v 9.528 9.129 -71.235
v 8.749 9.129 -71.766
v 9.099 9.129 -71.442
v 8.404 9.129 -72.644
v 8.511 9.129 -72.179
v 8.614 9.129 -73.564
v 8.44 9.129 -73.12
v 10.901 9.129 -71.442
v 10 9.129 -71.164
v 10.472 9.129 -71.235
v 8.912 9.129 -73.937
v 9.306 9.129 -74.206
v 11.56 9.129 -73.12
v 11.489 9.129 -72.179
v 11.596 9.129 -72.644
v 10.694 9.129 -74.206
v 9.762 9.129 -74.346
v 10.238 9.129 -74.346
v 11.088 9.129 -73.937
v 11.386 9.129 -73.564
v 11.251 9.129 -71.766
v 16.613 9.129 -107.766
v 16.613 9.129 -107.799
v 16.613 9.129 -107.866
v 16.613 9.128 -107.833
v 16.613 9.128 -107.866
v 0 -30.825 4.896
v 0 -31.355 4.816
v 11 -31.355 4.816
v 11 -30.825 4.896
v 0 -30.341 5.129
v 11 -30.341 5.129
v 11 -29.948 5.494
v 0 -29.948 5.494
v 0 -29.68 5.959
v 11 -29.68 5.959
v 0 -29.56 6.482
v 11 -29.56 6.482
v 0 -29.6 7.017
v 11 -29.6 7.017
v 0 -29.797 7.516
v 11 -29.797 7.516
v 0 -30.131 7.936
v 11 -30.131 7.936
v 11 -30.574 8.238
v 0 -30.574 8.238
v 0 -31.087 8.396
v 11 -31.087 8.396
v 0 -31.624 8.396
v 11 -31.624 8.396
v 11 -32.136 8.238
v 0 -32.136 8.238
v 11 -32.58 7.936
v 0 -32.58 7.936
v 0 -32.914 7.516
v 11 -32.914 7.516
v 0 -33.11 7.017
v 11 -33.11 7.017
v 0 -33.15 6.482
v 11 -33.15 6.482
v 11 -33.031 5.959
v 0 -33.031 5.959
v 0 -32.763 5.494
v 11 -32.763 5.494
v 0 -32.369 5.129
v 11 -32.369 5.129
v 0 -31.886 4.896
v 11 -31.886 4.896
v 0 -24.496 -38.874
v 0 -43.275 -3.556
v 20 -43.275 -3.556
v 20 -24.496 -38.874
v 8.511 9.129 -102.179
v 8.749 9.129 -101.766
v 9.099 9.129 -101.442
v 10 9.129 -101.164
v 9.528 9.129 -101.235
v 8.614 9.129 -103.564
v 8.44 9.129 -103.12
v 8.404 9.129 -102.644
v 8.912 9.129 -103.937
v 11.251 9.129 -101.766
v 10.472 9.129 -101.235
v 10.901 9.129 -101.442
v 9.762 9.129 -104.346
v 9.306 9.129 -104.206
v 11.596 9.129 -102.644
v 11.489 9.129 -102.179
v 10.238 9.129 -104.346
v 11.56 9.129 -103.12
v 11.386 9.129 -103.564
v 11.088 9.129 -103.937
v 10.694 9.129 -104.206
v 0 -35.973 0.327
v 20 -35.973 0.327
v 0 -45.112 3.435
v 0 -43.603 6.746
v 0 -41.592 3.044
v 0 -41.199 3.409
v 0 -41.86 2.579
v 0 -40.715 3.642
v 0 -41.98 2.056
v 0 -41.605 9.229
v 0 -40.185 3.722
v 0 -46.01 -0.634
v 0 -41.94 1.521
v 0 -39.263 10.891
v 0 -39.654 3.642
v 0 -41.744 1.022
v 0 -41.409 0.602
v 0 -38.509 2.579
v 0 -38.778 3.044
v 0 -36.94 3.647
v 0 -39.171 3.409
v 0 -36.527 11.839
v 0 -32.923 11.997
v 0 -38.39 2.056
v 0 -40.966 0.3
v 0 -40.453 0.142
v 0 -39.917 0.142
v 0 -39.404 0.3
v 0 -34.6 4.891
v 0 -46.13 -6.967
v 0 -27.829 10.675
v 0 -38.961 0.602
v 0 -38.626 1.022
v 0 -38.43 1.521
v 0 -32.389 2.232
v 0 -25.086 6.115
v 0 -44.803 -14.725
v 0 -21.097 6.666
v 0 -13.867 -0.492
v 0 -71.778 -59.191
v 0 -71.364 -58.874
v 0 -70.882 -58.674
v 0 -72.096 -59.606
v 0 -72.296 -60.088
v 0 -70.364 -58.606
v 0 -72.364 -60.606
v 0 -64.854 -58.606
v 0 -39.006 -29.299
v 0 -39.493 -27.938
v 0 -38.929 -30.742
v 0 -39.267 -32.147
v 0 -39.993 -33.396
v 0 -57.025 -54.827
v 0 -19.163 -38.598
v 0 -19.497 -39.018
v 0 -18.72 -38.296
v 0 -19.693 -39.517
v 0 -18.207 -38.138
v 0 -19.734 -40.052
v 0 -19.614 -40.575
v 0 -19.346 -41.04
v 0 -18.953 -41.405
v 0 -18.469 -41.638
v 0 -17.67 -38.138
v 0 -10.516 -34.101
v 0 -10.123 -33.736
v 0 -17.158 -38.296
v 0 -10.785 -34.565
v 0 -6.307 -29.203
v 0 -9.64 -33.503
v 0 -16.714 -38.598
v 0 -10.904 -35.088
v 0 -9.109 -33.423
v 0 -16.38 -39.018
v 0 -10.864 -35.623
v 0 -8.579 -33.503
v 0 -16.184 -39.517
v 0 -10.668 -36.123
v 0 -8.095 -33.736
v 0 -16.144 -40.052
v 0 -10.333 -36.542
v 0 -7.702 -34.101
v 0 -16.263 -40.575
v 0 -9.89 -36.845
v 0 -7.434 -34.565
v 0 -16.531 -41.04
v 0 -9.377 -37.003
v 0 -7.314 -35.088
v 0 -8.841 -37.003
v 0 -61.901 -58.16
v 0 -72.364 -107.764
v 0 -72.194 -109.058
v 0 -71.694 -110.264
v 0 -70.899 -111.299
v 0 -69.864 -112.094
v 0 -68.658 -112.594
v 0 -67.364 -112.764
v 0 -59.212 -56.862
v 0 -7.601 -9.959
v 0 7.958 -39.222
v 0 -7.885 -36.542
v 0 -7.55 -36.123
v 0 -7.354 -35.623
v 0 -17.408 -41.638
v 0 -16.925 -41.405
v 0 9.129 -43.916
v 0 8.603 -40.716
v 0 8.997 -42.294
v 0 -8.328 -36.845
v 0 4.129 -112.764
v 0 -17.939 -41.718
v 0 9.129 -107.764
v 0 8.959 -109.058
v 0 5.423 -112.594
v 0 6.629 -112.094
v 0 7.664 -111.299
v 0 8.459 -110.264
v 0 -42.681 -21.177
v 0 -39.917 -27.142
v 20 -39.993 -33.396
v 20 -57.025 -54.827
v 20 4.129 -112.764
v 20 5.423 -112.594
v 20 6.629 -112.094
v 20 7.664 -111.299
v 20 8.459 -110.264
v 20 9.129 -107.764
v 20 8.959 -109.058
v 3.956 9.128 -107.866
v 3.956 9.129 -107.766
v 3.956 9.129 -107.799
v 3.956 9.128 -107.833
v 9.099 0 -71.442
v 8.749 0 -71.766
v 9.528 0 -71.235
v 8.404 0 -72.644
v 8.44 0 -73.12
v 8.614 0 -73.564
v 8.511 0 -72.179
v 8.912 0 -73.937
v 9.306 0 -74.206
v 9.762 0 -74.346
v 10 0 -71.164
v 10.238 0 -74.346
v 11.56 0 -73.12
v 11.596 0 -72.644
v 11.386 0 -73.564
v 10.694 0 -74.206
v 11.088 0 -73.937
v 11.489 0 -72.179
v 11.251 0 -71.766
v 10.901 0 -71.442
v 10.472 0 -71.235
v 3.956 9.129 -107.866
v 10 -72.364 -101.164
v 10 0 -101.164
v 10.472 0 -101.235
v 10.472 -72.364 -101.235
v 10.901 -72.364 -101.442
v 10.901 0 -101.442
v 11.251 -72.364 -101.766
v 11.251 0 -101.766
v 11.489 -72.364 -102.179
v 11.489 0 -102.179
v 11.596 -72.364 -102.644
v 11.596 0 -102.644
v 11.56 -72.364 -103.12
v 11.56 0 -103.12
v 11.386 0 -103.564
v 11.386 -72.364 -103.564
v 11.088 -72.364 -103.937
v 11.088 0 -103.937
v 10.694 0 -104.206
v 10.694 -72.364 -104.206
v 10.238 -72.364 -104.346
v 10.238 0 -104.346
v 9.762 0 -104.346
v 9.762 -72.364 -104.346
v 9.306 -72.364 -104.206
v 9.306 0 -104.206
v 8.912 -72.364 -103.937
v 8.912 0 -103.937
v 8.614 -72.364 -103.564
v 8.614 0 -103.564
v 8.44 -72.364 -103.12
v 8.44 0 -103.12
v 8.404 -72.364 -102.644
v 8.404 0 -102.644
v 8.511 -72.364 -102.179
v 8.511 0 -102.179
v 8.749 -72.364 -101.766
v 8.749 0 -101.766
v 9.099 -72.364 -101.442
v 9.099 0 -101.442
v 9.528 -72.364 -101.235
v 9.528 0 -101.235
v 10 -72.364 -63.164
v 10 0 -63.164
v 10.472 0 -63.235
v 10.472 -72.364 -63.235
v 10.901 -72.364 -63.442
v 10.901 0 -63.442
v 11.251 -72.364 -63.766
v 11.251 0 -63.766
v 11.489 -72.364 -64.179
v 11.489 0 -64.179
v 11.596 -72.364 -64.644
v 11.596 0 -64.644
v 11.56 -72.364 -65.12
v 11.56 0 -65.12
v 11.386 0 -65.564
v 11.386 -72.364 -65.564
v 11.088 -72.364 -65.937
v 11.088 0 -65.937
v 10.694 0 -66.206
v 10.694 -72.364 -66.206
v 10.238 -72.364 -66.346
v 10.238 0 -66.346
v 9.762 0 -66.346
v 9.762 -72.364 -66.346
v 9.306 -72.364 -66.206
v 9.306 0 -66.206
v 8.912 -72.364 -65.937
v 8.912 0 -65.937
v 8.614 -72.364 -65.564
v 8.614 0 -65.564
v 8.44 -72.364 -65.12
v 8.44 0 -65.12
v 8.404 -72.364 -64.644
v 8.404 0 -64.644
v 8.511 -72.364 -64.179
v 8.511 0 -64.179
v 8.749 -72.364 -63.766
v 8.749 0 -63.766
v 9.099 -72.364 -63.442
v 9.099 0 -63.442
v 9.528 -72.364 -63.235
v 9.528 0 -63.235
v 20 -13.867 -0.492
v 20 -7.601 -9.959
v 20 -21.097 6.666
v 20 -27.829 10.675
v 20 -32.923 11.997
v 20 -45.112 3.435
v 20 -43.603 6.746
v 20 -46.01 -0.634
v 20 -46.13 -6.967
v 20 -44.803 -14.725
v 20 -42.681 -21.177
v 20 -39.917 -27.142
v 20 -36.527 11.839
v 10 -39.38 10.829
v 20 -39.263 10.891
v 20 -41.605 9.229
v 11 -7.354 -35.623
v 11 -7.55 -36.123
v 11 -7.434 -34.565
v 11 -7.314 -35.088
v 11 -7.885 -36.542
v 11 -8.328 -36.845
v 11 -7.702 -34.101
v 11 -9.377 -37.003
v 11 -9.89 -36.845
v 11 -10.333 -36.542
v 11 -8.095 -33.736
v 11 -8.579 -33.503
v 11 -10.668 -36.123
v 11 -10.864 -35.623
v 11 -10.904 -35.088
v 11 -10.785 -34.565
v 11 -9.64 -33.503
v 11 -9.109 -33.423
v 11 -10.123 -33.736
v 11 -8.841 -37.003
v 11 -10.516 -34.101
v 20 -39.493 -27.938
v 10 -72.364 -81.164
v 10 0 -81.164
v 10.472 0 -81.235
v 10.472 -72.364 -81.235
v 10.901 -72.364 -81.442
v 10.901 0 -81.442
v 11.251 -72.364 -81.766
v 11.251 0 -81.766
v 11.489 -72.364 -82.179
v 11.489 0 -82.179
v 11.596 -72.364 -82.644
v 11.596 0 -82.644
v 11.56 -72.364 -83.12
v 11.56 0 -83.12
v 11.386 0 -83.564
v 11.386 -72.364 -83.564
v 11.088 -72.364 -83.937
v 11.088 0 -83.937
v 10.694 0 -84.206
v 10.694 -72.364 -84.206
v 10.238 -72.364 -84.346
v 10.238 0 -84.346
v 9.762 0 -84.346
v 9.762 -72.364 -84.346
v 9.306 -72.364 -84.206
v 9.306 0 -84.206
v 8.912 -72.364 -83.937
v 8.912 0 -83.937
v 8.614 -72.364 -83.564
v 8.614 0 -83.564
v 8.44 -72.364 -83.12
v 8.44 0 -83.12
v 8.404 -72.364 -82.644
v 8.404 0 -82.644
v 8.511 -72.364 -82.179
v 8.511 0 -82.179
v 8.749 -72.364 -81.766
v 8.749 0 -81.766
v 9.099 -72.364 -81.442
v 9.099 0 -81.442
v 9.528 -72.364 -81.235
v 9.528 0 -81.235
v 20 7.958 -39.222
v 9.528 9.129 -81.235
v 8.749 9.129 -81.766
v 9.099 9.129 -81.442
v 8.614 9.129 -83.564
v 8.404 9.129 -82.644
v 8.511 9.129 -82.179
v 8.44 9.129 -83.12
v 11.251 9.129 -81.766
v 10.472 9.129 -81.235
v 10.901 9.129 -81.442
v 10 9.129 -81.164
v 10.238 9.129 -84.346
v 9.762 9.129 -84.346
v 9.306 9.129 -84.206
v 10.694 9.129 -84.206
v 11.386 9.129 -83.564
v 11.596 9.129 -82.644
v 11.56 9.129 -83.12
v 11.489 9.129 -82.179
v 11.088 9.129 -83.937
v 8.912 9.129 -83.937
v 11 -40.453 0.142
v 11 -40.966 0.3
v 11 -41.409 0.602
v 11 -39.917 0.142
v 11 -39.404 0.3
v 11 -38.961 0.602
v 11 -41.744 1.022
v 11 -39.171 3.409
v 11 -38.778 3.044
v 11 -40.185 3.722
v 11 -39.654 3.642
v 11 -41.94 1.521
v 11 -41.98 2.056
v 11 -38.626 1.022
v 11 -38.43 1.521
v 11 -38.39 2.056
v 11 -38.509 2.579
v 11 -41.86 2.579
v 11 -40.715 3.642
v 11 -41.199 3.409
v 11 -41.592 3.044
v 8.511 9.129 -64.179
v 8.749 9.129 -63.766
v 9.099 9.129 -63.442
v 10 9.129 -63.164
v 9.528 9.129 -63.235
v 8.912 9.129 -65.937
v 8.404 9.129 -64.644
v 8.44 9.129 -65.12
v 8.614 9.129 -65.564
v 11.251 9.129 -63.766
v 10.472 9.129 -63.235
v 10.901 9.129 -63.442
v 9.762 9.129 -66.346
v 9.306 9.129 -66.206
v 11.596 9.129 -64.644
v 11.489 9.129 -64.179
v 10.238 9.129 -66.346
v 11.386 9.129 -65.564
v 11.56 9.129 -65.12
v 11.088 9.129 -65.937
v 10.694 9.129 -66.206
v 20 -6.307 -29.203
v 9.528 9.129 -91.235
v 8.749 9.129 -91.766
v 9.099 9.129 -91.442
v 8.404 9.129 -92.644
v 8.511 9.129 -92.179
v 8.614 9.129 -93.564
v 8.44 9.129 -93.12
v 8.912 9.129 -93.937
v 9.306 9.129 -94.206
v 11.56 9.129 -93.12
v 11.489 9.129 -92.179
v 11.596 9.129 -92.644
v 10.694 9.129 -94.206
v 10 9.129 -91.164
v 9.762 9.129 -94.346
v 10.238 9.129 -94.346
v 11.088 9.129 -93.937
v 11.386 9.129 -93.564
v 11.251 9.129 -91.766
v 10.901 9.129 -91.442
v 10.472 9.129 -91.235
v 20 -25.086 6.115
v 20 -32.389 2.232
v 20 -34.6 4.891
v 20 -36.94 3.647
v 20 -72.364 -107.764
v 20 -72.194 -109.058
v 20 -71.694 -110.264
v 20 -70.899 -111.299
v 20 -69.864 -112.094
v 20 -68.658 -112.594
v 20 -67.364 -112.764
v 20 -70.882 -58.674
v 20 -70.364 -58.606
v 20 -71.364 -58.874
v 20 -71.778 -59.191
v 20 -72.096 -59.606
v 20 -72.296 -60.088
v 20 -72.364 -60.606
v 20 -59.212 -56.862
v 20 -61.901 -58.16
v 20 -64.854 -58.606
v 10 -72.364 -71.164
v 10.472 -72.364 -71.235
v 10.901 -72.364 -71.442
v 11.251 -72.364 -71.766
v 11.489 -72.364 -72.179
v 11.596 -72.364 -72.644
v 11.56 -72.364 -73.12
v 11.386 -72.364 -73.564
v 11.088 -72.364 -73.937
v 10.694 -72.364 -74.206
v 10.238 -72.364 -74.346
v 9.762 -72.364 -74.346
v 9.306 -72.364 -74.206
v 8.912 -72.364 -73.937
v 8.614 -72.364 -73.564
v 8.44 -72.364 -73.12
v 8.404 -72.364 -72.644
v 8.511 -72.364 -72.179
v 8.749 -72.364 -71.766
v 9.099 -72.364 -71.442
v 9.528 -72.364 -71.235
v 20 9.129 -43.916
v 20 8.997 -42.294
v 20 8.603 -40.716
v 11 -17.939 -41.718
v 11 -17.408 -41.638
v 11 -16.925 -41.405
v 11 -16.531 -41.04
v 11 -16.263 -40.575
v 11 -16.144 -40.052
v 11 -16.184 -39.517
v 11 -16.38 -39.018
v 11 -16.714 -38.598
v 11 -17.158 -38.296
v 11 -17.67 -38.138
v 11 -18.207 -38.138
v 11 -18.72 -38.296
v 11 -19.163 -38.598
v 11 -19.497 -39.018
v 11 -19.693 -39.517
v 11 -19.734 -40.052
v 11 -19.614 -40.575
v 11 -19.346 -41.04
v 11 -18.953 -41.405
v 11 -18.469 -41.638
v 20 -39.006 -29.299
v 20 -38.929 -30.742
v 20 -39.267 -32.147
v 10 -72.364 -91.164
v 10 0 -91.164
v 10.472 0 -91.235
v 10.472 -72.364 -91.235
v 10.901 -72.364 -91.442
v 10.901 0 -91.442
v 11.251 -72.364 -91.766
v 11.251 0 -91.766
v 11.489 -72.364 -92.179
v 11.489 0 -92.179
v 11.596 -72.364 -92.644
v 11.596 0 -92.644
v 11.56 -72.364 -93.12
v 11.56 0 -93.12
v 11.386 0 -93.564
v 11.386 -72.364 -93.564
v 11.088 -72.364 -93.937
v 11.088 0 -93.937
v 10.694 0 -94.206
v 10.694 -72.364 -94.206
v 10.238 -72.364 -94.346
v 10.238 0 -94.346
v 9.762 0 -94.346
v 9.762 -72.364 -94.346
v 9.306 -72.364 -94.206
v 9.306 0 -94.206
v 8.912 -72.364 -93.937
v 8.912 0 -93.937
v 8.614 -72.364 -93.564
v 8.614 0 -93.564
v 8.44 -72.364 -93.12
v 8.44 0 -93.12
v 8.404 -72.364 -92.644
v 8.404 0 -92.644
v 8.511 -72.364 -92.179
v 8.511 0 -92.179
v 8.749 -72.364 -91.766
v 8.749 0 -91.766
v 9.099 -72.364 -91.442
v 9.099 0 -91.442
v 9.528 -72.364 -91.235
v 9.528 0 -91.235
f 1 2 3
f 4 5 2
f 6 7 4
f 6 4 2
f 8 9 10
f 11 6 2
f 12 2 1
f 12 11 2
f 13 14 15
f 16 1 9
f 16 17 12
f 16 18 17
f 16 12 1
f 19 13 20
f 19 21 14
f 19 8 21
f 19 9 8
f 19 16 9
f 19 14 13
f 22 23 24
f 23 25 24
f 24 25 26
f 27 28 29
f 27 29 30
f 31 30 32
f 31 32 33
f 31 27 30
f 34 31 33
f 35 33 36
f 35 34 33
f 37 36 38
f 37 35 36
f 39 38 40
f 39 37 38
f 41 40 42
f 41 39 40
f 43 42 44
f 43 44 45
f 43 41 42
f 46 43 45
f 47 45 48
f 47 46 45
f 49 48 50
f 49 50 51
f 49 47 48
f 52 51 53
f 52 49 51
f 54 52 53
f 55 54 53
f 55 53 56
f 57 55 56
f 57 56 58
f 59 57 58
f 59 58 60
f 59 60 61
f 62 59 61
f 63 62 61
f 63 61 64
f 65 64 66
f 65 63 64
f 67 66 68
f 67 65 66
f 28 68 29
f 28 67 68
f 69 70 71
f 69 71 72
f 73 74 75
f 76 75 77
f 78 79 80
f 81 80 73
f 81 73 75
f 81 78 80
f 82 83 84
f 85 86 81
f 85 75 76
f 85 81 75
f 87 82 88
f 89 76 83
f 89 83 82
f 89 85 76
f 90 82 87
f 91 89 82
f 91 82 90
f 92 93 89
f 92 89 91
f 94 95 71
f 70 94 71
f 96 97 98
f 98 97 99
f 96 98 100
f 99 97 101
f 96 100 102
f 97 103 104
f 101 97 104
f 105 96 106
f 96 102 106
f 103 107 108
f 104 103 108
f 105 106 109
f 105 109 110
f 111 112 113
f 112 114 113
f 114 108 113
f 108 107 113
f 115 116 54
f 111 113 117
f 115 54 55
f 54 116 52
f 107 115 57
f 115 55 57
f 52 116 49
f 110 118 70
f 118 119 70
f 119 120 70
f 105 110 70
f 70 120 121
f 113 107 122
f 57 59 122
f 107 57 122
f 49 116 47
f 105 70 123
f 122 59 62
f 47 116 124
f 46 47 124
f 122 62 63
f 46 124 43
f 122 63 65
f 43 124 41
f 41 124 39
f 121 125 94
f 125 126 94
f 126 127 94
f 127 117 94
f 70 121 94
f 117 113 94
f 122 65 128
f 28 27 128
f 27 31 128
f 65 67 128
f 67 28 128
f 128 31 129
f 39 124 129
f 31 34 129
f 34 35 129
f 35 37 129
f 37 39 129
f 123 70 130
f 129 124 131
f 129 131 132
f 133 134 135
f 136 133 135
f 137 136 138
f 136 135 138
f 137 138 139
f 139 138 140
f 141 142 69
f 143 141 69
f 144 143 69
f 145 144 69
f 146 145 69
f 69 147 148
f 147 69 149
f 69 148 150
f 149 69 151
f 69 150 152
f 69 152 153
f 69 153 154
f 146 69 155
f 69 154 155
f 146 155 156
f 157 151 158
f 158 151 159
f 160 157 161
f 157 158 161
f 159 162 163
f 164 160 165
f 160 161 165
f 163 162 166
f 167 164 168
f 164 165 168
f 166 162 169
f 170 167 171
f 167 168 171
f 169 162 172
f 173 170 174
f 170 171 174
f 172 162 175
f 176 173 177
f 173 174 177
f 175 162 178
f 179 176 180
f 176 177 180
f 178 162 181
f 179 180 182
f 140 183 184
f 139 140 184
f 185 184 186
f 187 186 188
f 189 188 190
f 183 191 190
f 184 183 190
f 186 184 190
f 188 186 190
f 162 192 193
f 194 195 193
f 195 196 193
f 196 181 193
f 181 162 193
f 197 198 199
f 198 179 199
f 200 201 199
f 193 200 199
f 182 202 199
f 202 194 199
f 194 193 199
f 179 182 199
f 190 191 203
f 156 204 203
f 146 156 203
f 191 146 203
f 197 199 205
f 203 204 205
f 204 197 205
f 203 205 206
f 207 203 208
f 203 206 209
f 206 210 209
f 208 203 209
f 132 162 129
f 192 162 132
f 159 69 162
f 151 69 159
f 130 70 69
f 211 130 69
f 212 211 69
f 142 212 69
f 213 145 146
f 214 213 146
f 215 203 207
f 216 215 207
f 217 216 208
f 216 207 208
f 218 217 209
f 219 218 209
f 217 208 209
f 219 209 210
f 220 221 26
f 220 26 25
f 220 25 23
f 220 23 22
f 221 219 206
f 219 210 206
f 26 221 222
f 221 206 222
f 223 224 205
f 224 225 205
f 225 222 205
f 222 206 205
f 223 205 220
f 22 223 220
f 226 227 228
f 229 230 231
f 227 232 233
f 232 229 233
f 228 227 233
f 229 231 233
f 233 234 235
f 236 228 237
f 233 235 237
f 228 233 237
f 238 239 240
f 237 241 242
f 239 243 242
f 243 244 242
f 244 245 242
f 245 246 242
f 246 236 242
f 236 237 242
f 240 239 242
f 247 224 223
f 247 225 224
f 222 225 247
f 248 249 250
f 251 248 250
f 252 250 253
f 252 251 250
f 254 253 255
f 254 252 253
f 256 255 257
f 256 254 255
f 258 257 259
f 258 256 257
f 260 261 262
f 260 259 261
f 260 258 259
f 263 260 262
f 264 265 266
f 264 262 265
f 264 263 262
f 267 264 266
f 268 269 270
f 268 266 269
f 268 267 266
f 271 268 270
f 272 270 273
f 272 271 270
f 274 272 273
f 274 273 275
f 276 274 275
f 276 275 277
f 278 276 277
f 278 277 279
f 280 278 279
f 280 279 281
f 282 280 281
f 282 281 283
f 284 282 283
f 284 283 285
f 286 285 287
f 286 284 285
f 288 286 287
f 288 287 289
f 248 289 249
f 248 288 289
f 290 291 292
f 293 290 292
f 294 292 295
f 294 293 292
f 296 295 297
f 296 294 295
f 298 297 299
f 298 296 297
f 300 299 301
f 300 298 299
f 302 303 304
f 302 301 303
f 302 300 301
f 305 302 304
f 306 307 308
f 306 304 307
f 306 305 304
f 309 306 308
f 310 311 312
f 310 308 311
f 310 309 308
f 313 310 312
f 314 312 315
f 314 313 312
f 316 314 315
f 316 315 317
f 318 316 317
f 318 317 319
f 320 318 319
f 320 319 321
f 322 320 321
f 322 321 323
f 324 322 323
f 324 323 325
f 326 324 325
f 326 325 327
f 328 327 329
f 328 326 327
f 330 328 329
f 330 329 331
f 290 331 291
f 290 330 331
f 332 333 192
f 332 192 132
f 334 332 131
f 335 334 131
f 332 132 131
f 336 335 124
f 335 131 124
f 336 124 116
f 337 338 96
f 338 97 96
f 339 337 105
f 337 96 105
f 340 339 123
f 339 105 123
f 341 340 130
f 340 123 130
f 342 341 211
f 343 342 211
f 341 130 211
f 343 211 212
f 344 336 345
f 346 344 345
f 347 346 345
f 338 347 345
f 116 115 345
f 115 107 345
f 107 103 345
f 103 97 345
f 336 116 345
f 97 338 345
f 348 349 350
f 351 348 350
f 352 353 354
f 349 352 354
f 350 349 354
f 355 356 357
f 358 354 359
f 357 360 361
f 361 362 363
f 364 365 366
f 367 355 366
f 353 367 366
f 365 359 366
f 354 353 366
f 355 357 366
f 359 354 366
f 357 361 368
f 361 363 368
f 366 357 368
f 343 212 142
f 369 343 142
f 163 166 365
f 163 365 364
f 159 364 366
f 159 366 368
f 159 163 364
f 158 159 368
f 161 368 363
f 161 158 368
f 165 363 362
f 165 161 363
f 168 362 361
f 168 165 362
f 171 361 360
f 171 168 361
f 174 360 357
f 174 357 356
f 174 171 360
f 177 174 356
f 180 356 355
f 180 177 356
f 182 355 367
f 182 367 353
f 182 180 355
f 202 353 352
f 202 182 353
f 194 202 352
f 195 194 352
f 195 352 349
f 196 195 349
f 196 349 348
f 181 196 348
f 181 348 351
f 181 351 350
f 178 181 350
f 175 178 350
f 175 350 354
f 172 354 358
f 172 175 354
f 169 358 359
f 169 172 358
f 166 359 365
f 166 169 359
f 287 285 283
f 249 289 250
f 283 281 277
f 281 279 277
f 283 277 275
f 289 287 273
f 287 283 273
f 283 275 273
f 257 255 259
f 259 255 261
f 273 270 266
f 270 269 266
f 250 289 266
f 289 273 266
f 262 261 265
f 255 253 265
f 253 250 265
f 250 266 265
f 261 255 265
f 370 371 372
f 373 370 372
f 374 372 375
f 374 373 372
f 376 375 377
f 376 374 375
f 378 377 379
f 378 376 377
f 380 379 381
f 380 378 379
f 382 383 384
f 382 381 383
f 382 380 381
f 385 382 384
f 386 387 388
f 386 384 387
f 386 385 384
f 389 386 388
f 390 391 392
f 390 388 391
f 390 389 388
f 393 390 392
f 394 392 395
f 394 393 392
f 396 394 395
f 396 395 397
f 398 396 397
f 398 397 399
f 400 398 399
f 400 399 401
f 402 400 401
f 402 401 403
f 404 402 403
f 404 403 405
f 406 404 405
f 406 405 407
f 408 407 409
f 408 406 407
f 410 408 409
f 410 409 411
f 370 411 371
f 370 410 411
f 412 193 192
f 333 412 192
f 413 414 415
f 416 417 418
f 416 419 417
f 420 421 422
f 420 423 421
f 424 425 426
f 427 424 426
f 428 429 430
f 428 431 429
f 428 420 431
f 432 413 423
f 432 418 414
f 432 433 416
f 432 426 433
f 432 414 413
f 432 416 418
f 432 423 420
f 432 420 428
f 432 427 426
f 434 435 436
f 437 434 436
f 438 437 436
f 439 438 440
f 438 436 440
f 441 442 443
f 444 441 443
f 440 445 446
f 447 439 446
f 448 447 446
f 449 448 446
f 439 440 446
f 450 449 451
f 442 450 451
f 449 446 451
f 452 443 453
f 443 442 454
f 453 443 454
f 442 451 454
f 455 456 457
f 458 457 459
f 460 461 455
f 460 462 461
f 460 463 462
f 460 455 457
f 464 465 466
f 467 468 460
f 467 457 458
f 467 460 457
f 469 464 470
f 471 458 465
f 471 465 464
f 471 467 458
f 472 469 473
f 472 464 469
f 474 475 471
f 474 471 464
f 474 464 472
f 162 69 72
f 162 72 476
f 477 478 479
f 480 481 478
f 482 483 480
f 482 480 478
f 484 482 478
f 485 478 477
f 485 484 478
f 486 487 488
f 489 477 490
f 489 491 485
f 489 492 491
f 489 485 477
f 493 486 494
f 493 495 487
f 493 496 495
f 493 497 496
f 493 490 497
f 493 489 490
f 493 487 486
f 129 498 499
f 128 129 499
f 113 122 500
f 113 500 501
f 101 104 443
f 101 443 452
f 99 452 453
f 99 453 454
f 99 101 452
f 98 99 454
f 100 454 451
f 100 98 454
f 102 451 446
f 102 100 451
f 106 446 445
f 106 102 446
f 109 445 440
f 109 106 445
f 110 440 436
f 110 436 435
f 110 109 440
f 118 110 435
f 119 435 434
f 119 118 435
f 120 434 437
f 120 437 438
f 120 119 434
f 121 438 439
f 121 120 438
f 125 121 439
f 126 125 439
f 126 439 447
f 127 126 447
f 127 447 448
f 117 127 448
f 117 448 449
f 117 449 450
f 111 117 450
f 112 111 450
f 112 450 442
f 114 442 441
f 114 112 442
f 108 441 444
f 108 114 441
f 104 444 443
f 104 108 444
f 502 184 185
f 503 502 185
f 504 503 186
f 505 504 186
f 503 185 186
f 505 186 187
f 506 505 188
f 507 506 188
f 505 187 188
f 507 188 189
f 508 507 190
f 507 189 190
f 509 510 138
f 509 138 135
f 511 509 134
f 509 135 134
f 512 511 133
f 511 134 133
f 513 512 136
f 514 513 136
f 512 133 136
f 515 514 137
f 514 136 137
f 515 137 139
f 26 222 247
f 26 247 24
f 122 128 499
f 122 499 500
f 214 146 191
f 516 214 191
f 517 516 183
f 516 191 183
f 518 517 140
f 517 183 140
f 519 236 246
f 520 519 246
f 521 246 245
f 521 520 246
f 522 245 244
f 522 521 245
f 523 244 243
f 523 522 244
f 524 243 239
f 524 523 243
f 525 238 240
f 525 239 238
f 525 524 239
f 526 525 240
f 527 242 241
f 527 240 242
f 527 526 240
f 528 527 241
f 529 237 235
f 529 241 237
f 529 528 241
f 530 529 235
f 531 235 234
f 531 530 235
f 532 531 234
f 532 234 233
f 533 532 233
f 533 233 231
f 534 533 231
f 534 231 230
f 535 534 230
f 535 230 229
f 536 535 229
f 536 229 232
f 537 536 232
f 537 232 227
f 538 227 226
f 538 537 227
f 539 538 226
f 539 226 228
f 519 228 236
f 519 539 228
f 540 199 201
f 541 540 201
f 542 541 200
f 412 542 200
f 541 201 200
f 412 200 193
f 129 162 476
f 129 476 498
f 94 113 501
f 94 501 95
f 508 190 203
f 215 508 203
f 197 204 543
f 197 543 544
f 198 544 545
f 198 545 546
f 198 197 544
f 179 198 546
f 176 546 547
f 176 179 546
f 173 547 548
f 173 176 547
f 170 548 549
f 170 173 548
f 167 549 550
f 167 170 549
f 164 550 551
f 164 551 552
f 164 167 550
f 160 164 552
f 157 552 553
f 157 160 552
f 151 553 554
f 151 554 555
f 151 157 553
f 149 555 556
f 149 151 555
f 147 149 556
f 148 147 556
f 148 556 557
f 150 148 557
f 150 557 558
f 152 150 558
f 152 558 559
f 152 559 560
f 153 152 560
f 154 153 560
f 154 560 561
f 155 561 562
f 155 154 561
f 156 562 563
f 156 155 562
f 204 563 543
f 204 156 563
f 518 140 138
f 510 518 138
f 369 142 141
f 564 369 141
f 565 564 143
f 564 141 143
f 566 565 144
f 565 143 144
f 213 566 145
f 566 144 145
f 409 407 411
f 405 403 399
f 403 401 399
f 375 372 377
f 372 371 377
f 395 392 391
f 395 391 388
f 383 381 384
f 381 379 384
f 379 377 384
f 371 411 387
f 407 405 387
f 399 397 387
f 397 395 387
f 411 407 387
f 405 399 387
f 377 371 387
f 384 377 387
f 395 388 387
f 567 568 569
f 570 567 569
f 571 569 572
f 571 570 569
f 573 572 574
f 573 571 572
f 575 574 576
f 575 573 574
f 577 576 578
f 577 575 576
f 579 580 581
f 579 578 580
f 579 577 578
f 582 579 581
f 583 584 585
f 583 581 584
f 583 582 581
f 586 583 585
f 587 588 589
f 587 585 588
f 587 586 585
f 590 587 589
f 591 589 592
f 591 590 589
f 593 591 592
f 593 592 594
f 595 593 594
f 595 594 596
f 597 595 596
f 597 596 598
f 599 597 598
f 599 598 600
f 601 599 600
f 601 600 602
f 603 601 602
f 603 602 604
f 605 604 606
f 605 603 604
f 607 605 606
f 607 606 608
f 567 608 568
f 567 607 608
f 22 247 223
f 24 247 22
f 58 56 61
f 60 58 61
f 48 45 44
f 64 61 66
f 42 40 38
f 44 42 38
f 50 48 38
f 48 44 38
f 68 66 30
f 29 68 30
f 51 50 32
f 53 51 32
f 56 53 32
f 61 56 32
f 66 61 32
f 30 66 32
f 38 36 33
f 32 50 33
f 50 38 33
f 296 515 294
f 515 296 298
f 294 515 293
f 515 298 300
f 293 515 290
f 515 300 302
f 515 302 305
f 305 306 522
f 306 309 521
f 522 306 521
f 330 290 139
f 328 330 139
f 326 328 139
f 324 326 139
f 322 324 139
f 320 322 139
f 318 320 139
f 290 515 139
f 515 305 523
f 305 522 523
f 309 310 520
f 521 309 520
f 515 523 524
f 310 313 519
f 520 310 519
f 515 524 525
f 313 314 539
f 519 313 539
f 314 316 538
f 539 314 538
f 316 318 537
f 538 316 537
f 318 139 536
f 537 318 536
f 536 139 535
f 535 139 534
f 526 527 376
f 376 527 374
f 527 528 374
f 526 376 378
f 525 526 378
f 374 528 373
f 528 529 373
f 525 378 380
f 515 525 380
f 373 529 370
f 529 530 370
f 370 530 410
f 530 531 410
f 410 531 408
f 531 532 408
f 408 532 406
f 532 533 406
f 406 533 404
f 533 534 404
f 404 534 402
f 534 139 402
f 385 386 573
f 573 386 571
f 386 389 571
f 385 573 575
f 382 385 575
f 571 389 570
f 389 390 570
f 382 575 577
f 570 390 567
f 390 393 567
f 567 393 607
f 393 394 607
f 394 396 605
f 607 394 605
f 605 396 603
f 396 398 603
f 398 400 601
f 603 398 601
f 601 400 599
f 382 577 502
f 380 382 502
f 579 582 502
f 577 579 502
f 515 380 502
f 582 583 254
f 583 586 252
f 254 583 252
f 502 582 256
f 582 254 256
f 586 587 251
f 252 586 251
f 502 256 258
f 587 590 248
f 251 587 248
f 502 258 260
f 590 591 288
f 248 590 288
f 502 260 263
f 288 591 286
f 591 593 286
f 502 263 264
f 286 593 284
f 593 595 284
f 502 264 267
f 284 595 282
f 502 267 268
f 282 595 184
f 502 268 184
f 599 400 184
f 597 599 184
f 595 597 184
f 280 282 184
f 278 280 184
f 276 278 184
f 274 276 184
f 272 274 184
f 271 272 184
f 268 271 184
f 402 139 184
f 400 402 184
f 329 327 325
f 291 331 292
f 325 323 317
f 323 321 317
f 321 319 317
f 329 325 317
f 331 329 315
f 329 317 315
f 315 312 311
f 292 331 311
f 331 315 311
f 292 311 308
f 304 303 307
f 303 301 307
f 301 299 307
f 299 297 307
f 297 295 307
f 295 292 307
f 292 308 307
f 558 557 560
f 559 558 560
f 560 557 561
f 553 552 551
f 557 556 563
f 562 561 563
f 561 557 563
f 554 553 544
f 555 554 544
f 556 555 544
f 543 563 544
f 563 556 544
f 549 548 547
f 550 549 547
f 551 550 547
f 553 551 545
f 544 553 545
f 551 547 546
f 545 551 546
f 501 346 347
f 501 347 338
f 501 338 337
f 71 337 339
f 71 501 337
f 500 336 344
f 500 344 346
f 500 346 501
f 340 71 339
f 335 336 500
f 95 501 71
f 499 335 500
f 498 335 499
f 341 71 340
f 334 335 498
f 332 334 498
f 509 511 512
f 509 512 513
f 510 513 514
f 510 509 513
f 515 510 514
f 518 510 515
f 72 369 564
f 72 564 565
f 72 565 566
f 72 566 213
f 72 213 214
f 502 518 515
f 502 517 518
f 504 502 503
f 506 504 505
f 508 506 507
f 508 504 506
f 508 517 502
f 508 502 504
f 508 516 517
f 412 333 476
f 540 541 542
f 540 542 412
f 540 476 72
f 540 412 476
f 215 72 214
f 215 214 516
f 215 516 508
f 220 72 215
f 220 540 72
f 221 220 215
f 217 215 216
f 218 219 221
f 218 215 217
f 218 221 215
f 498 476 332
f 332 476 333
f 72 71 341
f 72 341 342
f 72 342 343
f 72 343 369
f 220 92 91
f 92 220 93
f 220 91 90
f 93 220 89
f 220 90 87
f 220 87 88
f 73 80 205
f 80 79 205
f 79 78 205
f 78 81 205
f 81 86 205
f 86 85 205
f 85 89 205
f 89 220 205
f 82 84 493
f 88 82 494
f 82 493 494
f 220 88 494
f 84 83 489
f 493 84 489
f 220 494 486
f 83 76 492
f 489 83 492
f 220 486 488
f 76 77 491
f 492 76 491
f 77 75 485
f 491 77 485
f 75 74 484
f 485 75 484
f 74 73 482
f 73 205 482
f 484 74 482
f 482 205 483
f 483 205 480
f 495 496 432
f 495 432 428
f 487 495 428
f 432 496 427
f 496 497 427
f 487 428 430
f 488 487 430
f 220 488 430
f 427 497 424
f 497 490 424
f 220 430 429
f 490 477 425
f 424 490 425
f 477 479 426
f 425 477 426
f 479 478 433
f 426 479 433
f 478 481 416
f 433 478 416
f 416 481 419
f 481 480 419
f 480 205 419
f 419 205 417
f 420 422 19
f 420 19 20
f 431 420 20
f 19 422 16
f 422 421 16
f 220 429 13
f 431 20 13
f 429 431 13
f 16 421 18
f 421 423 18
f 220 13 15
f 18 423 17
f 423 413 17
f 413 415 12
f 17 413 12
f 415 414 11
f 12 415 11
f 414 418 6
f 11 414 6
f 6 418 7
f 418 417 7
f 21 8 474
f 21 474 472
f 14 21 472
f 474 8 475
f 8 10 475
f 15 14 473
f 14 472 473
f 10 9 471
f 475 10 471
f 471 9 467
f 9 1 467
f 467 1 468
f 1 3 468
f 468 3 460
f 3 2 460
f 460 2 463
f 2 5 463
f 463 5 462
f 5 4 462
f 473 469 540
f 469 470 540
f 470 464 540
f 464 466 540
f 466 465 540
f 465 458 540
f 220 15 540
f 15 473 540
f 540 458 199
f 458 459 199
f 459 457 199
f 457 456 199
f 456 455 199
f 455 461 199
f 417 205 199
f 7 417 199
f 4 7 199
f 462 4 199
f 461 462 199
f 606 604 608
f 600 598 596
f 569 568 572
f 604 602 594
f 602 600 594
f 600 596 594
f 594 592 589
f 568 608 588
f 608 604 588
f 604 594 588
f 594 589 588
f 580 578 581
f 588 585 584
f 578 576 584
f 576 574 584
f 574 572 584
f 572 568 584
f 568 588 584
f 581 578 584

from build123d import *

# Parameters (mm, degrees)
EXTRUDE_1_DEPTH          = 20
CUT_EXTRUDE_2_DEPTH      = 20
SKETCH_1_12_R            = 1.8
CUT_EXTRUDE_3_DEPTH      = 11
CUT_EXTRUDE_5_DEPTH      = 136.4704716
CUT_EXTRUDE_5_DEPTH_BACK = 136.4704716
SKETCH_3_R               = 1.6
SKETCH_5_W               = 12.65769882
SKETCH_5_H               = 46.583877405
EXTRUDE_5_DEPTH          = 9.128947


with BuildPart() as part:
    # 草图1 → 凸台-拉伸1 (new body)
    with BuildSketch(Plane(origin=(0, 0, 0), x_dir=(0, 0, -1), z_dir=(1, 0, 0))):
        with BuildLine():
            Line((58.605640082, -64.854110761), (58.605640082, -70.36393759))
            ThreePointArc((58.605640082, -70.36393759), (59.19142652, -71.778151152), (60.605640082, -72.36393759))
            Line((60.605640082, -72.36393759), (107.763953331, -72.36393759))
            ThreePointArc((107.763953331, -72.36393759), (111.299487237, -70.899471496), (112.763953331, -67.36393759))
            Line((112.763953331, -67.36393759), (112.763953331, 4.12894742))
            ThreePointArc((112.763953331, 4.12894742), (111.299487237, 7.664481326), (107.763953331, 9.12894742))
            Line((107.763953331, 9.12894742), (43.916260913, 9.12894742))
            ThreePointArc((43.916260913, 9.12894742), (41.497041957, 8.831904682), (39.221545285, 7.958423348))
            Line((39.221545285, 7.958423348), (9.959078206, -7.600706391))
            add(Edge.make_bspline(
                [(9.959078206, -7.600706391), (-19.420707738, -23.222215678), (-10.829378139, -39.380156627), (-2.23804854, -55.538097577), (27.141737404, -39.91658829)],
                knots=[4.71238898, 4.71238898, 4.71238898, 6.283185307, 6.283185307, 7.853981634, 7.853981634, 7.853981634], degree=2, weights=[1, 0.707106781, 1, 0.707106781, 1]))
            Line((27.141737404, -39.91658829), (27.938173606, -39.49311565))
            ThreePointArc((27.938173606, -39.49311565), (30.741964236, -38.928730289), (33.396414198, -39.993468817))
            Line((33.396414198, -39.993468817), (54.827405639, -57.025341167))
            ThreePointArc((54.827405639, -57.025341167), (57.611684041, -60.507713148), (58.605640082, -64.854110761))
        make_face()
    extrude(amount=EXTRUDE_1_DEPTH)

    # 草图1<11> → 切除-拉伸2 (cut)
    with BuildSketch(Plane(origin=(0, 0, 0), x_dir=(0, 0, -1), z_dir=(1, 0, 0))):
        Polygon((-6.115071551, -25.08624568), (-2.232372323, -32.388540875), (-4.891184355, -34.599728538), (-3.646603058, -36.940445521), (-0.326656585, -35.972670897), (3.556042643, -43.274966093), (38.873946357, -24.496103581), (29.202832164, -6.307383168), align=None)
    extrude(amount=CUT_EXTRUDE_2_DEPTH, mode=Mode.SUBTRACT)

    # 草图1<12> → 切除-拉伸3 (cut)
    with BuildSketch(Plane(origin=(0, 0, 0), x_dir=(0, 0, -1), z_dir=(1, 0, 0))):
        with Locations((39.917537446, -17.938595088)):
            Circle(SKETCH_1_12_R)
        with Locations((-6.61625152, -31.355349065)):
            Circle(SKETCH_1_12_R)
        with Locations(Location((-1.921535892, -40.184824994, 0), (0, 0, 180))):
            Circle(SKETCH_1_12_R)
        with Locations(Location((35.222821818, -9.109119159, 0), (0, 0, 180))):
            Circle(SKETCH_1_12_R)
    extrude(amount=CUT_EXTRUDE_3_DEPTH, mode=Mode.SUBTRACT)

    # 草图3 → 切除-拉伸5 (cut, two sides: drawn at the far end of the back side and taken through both)
    with BuildSketch(Plane(origin=(0, 0, 0), x_dir=(1, 0, 0), z_dir=(0, 1, 0)).offset(-CUT_EXTRUDE_5_DEPTH_BACK)):
        with Locations(Location((10, 102.763953331, 0), (0, 0, 270))):
            Circle(SKETCH_3_R)
        with Locations(Location((10, 92.763953331, 0), (0, 0, 270))):
            Circle(SKETCH_3_R)
        with Locations(Location((10, 82.763953331, 0), (0, 0, 270))):
            Circle(SKETCH_3_R)
        with Locations(Location((10, 72.763953331, 0), (0, 0, 270))):
            Circle(SKETCH_3_R)
        with Locations(Location((10, 64.763953331, 0), (0, 0, 270))):
            Circle(SKETCH_3_R)
    extrude(amount=CUT_EXTRUDE_5_DEPTH + CUT_EXTRUDE_5_DEPTH_BACK, mode=Mode.SUBTRACT)

    # 草图5 → 凸台-拉伸5 (add)
    with BuildSketch(Plane(origin=(0, 0, 0), x_dir=(1, 0, 0), z_dir=(0, 1, 0))):
        with Locations((10.284635372, 84.574401096)):
            Rectangle(SKETCH_5_W, SKETCH_5_H)
    extrude(amount=EXTRUDE_5_DEPTH)


solid = part.part
